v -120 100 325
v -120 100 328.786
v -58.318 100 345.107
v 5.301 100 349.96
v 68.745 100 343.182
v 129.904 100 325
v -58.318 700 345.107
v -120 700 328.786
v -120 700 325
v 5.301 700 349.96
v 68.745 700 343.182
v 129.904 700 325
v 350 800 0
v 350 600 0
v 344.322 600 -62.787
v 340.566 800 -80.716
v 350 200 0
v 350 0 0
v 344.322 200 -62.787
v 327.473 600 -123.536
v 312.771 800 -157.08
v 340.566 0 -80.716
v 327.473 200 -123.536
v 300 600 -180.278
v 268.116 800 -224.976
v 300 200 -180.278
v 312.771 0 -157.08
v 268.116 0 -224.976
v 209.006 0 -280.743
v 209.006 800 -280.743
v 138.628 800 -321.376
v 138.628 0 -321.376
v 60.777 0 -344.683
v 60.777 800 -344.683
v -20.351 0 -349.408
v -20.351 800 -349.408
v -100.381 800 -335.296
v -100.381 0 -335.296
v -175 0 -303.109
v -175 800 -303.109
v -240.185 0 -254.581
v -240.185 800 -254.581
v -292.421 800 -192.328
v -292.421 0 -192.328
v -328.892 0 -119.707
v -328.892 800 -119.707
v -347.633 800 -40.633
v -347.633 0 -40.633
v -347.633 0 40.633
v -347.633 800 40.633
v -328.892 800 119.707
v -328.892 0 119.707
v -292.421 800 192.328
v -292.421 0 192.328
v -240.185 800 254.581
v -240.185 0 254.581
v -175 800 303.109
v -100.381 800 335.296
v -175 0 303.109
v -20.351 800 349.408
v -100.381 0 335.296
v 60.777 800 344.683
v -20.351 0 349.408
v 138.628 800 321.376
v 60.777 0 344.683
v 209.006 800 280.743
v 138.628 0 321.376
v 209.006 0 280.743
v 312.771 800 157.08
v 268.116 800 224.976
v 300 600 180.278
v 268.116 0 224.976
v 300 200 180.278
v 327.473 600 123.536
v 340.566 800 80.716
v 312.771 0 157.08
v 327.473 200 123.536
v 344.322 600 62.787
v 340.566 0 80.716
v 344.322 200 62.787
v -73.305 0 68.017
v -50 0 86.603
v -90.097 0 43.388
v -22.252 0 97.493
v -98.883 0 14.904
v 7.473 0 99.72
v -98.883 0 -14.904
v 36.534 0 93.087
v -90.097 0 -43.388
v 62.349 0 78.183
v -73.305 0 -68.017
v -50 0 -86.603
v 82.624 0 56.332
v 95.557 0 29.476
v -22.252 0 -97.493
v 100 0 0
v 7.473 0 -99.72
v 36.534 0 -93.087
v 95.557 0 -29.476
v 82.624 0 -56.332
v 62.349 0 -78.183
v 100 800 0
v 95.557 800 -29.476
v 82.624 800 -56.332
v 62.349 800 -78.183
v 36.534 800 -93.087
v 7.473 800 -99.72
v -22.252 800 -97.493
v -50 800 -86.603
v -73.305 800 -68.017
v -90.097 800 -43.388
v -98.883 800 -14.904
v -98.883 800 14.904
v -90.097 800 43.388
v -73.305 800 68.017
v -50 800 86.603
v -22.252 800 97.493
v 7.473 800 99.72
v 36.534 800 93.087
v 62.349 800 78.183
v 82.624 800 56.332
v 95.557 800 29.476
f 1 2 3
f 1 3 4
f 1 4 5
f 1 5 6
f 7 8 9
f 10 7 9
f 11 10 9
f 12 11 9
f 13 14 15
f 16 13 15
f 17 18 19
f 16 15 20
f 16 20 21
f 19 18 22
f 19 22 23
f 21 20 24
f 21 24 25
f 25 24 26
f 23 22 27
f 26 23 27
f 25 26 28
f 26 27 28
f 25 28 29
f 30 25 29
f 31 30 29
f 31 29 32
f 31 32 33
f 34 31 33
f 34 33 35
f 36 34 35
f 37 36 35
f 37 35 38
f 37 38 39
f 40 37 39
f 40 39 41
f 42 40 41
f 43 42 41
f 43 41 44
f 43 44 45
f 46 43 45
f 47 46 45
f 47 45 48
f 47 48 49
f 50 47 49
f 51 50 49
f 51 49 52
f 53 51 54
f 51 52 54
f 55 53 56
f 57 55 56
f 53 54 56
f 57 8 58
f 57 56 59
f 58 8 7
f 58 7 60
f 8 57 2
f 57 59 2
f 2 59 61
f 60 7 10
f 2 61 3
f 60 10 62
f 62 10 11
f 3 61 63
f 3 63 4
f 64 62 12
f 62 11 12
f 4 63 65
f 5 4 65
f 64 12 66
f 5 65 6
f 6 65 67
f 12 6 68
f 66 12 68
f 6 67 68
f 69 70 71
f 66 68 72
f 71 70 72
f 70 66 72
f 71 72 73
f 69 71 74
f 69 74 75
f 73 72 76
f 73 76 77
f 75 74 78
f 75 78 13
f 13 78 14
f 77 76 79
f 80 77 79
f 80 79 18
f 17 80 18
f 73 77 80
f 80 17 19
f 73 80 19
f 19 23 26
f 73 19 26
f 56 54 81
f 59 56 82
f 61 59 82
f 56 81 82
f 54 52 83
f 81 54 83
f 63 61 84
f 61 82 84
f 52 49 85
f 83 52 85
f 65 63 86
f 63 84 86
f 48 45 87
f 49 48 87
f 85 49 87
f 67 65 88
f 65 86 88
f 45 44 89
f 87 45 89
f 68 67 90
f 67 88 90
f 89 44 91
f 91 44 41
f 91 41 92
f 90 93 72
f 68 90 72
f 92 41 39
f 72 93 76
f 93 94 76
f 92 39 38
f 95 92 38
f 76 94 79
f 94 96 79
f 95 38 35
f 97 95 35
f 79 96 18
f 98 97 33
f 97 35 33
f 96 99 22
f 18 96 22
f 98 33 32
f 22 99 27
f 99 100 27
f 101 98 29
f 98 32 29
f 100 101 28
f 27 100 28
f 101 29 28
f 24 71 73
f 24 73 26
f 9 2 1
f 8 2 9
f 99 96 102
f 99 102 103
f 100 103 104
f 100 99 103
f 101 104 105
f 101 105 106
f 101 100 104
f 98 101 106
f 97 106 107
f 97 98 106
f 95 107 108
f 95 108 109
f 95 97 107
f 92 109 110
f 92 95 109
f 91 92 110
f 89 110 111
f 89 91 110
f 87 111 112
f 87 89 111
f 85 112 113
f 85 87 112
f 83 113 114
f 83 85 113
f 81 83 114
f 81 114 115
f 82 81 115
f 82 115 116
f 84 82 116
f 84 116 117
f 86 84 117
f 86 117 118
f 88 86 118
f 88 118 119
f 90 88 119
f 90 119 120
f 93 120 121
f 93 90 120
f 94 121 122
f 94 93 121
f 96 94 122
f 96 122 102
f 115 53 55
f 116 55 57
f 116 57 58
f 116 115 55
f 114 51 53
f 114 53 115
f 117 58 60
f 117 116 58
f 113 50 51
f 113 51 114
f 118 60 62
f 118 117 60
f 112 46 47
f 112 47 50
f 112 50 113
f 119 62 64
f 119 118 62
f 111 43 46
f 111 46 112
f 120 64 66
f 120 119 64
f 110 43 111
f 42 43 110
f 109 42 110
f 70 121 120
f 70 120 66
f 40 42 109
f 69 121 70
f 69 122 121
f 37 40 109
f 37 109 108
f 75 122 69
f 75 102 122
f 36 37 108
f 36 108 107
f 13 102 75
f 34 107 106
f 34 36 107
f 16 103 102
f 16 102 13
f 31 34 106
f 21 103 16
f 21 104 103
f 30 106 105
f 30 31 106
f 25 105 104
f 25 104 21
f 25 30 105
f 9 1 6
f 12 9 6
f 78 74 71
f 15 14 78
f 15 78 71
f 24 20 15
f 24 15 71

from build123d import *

# Parameters (mm, degrees)
SKETCH1_R           = 350
SKETCH1_R_2         = 100
BOSS_EXTRUDE1_DEPTH = 800
SKETCH2_W           = 250
SKETCH2_H           = 600
CUT_EXTRUDE1_DEPTH  = 25
SKETCH3_W           = 366
SKETCH3_H           = 400
CUT_EXTRUDE2_DEPTH  = 50


with BuildPart() as part:
    # Sketch1 → Boss-Extrude1 (new body)
    with BuildSketch(Plane(origin=(0, 0, 0), x_dir=(1, 0, 0), z_dir=(0, 1, 0))):
        Circle(SKETCH1_R)
        Circle(SKETCH1_R_2, mode=Mode.SUBTRACT)
    extrude(amount=BOSS_EXTRUDE1_DEPTH)

    # Sketch2 → Cut-Extrude1 (cut)
    with BuildSketch(Plane.XY.offset(350)):
        with Locations((5, 400)):
            Rectangle(SKETCH2_W, SKETCH2_H)
    extrude(amount=-CUT_EXTRUDE1_DEPTH, mode=Mode.SUBTRACT)

    # Sketch3 → Cut-Extrude2 (cut)
    with BuildSketch(Plane(origin=(350, 0, 0), x_dir=(0, 0, -1), z_dir=(1, 0, 0))):
        with Locations((-2.7, 400)):
            Rectangle(SKETCH3_W, SKETCH3_H)
    extrude(amount=-CUT_EXTRUDE2_DEPTH, mode=Mode.SUBTRACT)


solid = part.part
